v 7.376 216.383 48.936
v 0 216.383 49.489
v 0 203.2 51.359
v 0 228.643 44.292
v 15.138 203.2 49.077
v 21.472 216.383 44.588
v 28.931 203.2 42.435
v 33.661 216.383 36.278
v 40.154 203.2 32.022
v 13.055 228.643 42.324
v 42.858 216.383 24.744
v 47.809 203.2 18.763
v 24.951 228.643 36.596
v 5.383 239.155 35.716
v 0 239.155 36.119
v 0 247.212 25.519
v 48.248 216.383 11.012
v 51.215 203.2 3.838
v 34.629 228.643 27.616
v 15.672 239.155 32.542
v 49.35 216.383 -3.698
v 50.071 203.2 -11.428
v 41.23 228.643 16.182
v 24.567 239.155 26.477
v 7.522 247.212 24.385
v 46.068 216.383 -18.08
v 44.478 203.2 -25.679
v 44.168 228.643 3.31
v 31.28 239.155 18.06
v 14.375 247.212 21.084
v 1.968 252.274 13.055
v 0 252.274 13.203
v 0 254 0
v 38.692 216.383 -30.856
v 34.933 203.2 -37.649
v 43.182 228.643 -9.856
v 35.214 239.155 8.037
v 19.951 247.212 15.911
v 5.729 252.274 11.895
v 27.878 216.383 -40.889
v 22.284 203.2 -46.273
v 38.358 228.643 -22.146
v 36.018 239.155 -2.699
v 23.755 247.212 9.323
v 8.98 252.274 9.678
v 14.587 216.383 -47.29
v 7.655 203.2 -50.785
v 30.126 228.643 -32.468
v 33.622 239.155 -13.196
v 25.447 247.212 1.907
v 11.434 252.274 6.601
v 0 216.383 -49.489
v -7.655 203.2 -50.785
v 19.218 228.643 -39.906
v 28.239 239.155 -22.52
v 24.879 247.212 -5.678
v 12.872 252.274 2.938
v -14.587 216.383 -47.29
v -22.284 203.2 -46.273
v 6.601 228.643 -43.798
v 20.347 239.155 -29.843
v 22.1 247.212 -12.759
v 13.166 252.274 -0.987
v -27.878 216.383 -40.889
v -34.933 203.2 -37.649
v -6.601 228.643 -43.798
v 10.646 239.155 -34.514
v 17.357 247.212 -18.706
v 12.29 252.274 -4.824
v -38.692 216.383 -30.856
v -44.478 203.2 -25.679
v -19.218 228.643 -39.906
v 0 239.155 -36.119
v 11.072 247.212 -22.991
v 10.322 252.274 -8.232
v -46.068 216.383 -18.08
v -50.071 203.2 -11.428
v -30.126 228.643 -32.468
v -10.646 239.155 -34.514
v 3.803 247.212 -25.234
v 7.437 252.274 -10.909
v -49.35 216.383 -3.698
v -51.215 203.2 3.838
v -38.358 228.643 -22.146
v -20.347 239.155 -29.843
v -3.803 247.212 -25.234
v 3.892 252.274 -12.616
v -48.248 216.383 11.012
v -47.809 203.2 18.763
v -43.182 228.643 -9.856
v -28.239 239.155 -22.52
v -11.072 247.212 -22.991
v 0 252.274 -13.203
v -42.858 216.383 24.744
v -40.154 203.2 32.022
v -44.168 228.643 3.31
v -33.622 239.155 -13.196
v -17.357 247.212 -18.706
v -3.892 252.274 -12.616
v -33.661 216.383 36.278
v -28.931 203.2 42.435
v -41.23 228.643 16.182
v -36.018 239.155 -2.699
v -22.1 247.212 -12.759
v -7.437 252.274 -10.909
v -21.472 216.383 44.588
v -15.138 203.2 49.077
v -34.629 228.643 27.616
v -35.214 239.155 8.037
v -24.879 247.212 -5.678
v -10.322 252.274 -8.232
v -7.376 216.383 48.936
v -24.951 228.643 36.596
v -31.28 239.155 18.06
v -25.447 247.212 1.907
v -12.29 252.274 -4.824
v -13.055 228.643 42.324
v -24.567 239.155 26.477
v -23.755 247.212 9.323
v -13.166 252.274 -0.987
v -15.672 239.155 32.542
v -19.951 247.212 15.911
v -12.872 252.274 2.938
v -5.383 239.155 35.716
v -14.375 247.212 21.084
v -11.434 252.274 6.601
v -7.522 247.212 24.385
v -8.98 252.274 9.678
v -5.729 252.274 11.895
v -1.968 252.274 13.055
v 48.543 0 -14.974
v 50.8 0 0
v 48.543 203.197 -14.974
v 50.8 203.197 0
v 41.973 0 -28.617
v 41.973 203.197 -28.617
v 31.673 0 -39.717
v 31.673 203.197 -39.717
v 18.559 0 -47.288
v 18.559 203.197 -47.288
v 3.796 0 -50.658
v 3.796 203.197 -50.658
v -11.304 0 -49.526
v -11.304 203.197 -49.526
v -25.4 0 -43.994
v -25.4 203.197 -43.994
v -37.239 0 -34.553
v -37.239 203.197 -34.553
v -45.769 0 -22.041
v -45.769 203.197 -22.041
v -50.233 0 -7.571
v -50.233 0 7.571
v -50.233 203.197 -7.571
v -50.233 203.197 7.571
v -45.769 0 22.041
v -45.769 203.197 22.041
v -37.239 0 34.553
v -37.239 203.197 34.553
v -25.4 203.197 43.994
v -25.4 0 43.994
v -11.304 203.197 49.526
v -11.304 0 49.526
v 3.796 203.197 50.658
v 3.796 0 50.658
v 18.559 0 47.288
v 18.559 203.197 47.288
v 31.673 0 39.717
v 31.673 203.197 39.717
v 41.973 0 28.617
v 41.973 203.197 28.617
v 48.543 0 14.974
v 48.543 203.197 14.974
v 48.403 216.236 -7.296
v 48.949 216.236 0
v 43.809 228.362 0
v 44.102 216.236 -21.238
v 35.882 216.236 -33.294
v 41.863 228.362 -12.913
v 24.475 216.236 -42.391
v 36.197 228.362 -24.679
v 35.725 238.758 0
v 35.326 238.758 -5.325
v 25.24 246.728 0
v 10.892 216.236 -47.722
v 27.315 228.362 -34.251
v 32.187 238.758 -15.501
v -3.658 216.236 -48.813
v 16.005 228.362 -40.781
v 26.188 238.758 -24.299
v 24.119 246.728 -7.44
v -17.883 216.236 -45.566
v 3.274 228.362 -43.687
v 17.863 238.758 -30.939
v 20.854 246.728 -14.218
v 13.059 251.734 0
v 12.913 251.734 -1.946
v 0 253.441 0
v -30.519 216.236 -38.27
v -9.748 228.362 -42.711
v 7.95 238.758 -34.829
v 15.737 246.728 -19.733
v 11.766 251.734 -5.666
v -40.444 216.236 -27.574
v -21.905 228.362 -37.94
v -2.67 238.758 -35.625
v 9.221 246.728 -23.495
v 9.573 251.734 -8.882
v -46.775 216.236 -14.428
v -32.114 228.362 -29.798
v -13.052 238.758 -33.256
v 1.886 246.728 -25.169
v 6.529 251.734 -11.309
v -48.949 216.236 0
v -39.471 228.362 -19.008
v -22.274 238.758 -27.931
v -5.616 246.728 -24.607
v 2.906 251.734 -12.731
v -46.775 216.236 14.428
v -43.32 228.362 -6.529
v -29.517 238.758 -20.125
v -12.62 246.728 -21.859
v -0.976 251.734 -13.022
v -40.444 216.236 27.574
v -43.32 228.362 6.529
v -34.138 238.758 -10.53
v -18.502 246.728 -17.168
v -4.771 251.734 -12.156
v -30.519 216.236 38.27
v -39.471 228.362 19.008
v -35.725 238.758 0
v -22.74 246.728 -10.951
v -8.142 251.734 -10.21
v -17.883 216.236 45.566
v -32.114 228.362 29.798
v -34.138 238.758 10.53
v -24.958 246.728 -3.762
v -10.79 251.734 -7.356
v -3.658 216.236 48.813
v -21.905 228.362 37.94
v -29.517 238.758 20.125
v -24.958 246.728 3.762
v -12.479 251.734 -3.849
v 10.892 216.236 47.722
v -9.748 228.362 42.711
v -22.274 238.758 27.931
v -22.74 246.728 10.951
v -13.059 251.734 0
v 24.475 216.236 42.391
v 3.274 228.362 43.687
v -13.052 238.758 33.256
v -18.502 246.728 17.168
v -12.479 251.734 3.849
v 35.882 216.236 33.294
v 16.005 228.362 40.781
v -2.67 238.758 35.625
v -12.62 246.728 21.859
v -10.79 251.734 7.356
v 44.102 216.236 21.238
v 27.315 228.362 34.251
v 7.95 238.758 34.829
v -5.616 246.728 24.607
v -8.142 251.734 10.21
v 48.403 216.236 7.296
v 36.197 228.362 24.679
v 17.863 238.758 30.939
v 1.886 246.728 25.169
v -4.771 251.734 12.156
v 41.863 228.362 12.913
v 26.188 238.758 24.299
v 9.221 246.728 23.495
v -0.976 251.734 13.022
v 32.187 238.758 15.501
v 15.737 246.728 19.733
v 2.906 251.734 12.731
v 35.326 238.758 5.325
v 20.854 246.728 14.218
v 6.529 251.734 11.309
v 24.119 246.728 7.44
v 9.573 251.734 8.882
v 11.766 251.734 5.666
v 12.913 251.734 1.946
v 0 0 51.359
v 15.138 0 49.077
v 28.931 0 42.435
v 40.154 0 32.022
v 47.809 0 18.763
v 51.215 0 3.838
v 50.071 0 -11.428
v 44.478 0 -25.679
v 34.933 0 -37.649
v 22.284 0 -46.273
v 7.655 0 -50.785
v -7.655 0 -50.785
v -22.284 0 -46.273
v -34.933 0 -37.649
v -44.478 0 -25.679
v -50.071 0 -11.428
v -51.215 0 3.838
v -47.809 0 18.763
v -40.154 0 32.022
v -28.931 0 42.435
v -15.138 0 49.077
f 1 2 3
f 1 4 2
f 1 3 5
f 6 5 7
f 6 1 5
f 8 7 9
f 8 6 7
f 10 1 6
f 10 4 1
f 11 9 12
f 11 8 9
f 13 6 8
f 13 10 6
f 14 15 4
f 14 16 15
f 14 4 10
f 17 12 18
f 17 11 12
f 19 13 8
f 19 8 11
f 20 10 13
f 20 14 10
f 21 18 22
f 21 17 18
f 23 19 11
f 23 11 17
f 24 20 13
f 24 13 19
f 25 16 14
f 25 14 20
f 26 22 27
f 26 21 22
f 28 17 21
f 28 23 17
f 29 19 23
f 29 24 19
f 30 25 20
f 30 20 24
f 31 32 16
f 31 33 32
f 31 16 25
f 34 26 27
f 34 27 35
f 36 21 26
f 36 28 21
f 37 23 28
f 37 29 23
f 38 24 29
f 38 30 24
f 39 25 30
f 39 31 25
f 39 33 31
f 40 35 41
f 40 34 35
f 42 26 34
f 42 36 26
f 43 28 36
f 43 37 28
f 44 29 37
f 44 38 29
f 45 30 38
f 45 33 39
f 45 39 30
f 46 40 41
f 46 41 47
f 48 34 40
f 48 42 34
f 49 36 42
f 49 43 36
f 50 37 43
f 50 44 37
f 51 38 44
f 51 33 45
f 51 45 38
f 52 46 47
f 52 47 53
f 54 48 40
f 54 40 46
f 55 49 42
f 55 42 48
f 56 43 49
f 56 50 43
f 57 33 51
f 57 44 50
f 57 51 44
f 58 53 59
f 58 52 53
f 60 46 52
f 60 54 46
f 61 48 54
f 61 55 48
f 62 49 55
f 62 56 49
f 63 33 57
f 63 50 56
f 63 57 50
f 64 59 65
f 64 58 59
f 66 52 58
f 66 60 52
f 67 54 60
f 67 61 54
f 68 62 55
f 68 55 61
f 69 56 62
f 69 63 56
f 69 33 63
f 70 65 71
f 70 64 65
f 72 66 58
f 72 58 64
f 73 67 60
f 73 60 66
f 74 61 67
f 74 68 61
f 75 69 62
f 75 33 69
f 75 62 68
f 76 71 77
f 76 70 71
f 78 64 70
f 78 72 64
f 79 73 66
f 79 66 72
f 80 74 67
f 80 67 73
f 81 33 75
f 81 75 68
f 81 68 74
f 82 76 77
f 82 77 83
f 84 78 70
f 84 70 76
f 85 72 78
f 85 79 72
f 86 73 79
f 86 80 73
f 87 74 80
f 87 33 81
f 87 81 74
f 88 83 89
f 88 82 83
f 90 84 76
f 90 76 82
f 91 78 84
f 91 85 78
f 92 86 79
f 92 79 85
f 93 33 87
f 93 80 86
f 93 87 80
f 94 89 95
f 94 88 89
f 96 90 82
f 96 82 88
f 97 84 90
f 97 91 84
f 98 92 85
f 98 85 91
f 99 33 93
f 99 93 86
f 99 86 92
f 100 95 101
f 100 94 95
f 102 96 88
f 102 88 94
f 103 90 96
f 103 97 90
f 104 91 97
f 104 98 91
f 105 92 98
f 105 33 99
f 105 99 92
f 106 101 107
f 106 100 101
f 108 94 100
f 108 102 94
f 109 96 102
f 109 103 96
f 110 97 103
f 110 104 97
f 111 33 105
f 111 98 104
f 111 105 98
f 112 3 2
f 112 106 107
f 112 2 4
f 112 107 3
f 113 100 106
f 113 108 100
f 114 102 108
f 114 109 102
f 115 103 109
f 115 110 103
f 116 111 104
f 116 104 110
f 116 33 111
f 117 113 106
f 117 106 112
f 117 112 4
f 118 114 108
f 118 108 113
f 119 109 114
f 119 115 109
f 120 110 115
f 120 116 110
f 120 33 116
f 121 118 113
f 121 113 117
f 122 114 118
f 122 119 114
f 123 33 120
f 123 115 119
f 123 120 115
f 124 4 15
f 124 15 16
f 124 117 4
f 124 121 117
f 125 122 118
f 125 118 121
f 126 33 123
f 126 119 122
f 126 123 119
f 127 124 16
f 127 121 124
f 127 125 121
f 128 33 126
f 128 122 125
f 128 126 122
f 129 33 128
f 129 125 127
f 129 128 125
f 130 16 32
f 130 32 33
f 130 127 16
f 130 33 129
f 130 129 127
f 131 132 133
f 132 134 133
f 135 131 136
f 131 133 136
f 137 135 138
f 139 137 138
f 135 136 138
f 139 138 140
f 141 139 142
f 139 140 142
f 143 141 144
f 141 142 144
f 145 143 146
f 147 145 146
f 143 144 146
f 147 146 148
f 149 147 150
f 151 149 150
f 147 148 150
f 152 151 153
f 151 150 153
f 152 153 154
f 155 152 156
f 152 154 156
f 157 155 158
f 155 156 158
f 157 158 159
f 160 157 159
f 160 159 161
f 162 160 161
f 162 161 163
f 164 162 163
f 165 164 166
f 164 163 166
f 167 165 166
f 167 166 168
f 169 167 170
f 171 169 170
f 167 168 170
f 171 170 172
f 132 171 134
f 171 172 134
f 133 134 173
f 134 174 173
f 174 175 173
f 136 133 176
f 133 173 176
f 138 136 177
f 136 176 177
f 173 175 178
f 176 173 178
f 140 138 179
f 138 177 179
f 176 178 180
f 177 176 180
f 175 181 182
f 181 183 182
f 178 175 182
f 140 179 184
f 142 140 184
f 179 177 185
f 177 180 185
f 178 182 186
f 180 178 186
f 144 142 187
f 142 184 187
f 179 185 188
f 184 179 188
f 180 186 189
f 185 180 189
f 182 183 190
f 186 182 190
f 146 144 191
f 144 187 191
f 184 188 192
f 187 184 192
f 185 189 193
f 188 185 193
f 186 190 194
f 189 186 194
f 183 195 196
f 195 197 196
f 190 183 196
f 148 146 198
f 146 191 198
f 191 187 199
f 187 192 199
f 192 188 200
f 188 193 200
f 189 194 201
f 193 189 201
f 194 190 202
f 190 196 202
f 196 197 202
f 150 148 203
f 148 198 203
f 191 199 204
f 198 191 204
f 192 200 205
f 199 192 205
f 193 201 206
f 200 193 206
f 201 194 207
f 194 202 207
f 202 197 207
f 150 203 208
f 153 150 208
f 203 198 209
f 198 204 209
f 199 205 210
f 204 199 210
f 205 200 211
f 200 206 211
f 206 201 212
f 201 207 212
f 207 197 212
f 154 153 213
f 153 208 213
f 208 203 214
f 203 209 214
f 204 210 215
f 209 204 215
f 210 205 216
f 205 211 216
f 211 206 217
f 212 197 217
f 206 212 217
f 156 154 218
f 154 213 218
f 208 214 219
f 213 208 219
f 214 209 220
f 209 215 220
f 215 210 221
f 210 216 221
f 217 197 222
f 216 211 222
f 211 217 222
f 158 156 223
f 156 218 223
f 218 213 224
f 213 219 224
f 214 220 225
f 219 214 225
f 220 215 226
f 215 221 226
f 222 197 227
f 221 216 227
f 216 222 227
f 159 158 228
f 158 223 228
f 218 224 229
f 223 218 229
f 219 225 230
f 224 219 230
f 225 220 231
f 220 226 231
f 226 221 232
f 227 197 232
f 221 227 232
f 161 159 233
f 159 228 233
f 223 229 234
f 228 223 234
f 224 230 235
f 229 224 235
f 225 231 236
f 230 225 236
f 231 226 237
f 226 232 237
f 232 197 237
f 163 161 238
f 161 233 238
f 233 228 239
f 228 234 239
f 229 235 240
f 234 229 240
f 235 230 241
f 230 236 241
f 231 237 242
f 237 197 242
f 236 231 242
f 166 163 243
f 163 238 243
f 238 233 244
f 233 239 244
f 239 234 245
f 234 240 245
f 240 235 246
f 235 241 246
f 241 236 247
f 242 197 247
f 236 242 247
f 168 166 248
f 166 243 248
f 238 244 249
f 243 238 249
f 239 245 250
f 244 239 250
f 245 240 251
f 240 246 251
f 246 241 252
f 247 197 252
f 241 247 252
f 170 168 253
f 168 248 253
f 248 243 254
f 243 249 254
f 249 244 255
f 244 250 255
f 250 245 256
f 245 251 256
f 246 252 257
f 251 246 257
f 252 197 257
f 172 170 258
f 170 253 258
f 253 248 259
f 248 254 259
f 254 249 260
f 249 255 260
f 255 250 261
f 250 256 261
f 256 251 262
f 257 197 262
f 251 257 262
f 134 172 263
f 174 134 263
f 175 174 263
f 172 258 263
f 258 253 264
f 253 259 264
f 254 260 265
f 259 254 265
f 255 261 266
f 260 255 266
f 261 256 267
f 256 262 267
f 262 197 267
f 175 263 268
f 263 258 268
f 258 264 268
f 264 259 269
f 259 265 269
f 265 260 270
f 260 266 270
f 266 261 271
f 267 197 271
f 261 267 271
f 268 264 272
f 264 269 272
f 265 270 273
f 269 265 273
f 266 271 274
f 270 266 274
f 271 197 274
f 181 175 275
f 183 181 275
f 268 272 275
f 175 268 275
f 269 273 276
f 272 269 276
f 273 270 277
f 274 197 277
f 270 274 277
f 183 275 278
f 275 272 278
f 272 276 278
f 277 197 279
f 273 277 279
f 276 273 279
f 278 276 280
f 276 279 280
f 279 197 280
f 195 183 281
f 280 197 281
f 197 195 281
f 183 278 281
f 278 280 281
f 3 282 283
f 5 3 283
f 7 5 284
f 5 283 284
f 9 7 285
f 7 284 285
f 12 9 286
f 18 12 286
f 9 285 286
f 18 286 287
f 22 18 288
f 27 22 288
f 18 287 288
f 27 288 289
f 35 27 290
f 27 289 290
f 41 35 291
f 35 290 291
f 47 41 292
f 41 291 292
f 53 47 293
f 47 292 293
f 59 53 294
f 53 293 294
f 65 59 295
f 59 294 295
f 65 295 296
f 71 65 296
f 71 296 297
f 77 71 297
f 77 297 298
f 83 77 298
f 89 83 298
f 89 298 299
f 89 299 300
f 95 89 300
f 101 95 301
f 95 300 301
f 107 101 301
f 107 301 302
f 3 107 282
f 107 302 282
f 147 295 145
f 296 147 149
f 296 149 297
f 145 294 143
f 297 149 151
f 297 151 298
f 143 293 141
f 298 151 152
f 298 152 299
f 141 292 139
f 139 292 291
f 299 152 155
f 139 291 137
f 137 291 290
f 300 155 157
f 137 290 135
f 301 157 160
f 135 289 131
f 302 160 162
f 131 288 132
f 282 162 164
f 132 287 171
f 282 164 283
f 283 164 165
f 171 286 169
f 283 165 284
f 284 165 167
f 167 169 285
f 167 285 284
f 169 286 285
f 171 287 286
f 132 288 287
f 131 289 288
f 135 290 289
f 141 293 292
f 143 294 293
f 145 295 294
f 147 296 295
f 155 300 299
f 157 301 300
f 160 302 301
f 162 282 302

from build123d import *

# Parameters (mm, degrees)
SKETCH1_R           = 51.3588
BOSS_EXTRUDE1_DEPTH = 203.2
DOME1_FACE_RADIUS   = 51.3588
DOME1_HEIGHT        = 50.8


# Read off the part's stored shape, not the designer's step: Shell1
with BuildPart() as part:
    # Sketch1 → Boss-Extrude1 (new body)
    with BuildSketch(Plane(origin=(0, 0, 0), x_dir=(1, 0, 0), z_dir=(0, 1, 0))):
        with Locations(Location((0, 0, 0), (0, 0, 270))):
            Circle(SKETCH1_R)
    extrude(amount=BOSS_EXTRUDE1_DEPTH)

    # Dome1: a dome of height H over a round flat face of radius A is a cap of a sphere of radius (A * A + H * H) / (2 * H)
    dome1_r = (DOME1_FACE_RADIUS * DOME1_FACE_RADIUS + DOME1_HEIGHT * DOME1_HEIGHT) / (2 * DOME1_HEIGHT)
    dome1_base = Plane((0, 203.2, 0), z_dir=(0, 1, 0))
    with Locations(dome1_base.offset(DOME1_HEIGHT - dome1_r)):
        dome1_ball = Sphere(dome1_r, mode=Mode.PRIVATE)
    add(split(dome1_ball, bisect_by=dome1_base, keep=Keep.TOP, mode=Mode.PRIVATE))

    # Shell1 outline → Shell1 (revolve, cut)
    with BuildSketch(Plane.XY):
        with BuildLine():
            Line((50.8, 0), (50.800000001, 203.196935001))
            ThreePointArc((50.800000001, 203.196935001), (35.725082804, 238.75835259), (0, 253.4412))
            Line((0, 253.4412), (0, 0))
            Line((0, 0), (50.8, 0))
        make_face()
    revolve(axis=Axis((0, 0, 0), (0, 1, 0)), mode=Mode.SUBTRACT)


solid = part.part
